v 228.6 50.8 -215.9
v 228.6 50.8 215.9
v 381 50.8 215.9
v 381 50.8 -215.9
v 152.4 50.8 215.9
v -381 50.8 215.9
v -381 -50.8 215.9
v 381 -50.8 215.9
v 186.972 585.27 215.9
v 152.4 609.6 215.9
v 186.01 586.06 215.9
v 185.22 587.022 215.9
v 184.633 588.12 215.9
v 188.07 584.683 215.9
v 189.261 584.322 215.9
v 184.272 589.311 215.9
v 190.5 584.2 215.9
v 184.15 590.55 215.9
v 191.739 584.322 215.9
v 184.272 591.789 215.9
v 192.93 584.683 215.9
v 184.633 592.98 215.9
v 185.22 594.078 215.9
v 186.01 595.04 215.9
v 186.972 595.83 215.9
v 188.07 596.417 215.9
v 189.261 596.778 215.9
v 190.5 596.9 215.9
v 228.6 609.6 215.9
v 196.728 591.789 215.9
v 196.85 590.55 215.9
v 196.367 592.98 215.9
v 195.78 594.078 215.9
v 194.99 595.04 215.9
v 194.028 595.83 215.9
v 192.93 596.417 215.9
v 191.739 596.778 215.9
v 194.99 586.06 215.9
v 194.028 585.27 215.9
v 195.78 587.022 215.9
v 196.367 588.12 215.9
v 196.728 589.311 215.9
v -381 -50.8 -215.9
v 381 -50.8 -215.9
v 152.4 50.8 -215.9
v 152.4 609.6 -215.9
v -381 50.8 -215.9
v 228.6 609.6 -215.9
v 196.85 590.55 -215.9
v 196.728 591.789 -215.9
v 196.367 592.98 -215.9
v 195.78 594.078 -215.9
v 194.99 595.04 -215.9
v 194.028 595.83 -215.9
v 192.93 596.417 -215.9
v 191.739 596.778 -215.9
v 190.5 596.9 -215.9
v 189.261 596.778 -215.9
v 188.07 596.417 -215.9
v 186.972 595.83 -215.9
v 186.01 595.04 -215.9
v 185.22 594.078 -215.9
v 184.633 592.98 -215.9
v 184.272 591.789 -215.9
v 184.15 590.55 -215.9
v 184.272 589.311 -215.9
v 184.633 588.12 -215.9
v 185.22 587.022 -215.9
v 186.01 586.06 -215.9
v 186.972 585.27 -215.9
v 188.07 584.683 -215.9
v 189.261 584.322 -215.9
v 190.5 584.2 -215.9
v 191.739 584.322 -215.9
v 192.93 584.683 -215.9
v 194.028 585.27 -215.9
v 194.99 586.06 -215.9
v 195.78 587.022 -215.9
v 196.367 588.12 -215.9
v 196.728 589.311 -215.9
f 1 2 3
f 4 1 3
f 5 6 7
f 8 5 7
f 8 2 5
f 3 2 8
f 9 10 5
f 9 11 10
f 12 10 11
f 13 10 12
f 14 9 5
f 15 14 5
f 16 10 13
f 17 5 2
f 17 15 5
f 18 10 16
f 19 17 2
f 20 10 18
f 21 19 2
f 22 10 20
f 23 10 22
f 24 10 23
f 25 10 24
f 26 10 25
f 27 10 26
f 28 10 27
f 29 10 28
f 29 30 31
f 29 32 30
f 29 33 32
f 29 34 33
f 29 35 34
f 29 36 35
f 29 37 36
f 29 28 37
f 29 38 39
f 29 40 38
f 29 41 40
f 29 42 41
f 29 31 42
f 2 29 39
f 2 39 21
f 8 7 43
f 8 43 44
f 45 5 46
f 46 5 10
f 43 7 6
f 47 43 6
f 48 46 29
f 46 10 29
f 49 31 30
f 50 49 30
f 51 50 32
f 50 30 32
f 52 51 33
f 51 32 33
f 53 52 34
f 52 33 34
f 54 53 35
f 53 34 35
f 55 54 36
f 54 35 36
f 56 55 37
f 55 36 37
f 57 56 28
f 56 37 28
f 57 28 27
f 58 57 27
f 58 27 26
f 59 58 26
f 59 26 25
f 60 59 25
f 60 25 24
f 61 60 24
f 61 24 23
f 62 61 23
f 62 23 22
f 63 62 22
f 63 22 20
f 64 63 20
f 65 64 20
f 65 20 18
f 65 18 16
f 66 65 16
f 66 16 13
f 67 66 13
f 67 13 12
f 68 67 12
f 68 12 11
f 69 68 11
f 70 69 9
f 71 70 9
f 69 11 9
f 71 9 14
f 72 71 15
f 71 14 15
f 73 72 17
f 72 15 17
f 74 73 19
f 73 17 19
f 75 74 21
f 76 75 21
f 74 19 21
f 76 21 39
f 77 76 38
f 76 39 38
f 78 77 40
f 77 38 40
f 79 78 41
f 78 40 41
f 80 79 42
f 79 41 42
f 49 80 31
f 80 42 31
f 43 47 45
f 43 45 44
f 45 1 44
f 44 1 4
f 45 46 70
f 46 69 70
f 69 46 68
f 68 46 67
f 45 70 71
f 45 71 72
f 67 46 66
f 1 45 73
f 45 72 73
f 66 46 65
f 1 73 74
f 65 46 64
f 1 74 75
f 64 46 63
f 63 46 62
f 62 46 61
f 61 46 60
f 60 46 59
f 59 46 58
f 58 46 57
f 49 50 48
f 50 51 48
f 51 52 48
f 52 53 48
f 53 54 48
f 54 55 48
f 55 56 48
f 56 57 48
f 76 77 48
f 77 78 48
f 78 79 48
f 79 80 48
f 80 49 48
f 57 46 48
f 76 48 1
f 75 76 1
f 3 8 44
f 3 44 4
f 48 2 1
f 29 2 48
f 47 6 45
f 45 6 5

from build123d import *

# Parameters (mm, degrees)
SKETCH1_W           = 762
SKETCH1_H           = 101.6
SKETCH1_W_2         = 76.2
SKETCH1_H_2         = 558.8
BOSS_EXTRUDE1_DEPTH = 215.9
SKETCH2_R           = 6.35
CUT_EXTRUDE1_DEPTH  = 432.8


with BuildPart() as part:
    # Sketch1 → Boss-Extrude1 (new body, symmetric)
    with BuildSketch(Plane.XY):
        Rectangle(SKETCH1_W, SKETCH1_H)
        with Locations((190.5, 330.2)):
            Rectangle(SKETCH1_W_2, SKETCH1_H_2)
    extrude(amount=BOSS_EXTRUDE1_DEPTH, both=True)

    # Sketch2 → Cut-Extrude1 (cut, through all)
    with BuildSketch(Plane.XY.offset(215.9)):
        with Locations((190.5, 590.55)):
            Circle(SKETCH2_R)
    extrude(amount=-CUT_EXTRUDE1_DEPTH, mode=Mode.SUBTRACT)


solid = part.part
